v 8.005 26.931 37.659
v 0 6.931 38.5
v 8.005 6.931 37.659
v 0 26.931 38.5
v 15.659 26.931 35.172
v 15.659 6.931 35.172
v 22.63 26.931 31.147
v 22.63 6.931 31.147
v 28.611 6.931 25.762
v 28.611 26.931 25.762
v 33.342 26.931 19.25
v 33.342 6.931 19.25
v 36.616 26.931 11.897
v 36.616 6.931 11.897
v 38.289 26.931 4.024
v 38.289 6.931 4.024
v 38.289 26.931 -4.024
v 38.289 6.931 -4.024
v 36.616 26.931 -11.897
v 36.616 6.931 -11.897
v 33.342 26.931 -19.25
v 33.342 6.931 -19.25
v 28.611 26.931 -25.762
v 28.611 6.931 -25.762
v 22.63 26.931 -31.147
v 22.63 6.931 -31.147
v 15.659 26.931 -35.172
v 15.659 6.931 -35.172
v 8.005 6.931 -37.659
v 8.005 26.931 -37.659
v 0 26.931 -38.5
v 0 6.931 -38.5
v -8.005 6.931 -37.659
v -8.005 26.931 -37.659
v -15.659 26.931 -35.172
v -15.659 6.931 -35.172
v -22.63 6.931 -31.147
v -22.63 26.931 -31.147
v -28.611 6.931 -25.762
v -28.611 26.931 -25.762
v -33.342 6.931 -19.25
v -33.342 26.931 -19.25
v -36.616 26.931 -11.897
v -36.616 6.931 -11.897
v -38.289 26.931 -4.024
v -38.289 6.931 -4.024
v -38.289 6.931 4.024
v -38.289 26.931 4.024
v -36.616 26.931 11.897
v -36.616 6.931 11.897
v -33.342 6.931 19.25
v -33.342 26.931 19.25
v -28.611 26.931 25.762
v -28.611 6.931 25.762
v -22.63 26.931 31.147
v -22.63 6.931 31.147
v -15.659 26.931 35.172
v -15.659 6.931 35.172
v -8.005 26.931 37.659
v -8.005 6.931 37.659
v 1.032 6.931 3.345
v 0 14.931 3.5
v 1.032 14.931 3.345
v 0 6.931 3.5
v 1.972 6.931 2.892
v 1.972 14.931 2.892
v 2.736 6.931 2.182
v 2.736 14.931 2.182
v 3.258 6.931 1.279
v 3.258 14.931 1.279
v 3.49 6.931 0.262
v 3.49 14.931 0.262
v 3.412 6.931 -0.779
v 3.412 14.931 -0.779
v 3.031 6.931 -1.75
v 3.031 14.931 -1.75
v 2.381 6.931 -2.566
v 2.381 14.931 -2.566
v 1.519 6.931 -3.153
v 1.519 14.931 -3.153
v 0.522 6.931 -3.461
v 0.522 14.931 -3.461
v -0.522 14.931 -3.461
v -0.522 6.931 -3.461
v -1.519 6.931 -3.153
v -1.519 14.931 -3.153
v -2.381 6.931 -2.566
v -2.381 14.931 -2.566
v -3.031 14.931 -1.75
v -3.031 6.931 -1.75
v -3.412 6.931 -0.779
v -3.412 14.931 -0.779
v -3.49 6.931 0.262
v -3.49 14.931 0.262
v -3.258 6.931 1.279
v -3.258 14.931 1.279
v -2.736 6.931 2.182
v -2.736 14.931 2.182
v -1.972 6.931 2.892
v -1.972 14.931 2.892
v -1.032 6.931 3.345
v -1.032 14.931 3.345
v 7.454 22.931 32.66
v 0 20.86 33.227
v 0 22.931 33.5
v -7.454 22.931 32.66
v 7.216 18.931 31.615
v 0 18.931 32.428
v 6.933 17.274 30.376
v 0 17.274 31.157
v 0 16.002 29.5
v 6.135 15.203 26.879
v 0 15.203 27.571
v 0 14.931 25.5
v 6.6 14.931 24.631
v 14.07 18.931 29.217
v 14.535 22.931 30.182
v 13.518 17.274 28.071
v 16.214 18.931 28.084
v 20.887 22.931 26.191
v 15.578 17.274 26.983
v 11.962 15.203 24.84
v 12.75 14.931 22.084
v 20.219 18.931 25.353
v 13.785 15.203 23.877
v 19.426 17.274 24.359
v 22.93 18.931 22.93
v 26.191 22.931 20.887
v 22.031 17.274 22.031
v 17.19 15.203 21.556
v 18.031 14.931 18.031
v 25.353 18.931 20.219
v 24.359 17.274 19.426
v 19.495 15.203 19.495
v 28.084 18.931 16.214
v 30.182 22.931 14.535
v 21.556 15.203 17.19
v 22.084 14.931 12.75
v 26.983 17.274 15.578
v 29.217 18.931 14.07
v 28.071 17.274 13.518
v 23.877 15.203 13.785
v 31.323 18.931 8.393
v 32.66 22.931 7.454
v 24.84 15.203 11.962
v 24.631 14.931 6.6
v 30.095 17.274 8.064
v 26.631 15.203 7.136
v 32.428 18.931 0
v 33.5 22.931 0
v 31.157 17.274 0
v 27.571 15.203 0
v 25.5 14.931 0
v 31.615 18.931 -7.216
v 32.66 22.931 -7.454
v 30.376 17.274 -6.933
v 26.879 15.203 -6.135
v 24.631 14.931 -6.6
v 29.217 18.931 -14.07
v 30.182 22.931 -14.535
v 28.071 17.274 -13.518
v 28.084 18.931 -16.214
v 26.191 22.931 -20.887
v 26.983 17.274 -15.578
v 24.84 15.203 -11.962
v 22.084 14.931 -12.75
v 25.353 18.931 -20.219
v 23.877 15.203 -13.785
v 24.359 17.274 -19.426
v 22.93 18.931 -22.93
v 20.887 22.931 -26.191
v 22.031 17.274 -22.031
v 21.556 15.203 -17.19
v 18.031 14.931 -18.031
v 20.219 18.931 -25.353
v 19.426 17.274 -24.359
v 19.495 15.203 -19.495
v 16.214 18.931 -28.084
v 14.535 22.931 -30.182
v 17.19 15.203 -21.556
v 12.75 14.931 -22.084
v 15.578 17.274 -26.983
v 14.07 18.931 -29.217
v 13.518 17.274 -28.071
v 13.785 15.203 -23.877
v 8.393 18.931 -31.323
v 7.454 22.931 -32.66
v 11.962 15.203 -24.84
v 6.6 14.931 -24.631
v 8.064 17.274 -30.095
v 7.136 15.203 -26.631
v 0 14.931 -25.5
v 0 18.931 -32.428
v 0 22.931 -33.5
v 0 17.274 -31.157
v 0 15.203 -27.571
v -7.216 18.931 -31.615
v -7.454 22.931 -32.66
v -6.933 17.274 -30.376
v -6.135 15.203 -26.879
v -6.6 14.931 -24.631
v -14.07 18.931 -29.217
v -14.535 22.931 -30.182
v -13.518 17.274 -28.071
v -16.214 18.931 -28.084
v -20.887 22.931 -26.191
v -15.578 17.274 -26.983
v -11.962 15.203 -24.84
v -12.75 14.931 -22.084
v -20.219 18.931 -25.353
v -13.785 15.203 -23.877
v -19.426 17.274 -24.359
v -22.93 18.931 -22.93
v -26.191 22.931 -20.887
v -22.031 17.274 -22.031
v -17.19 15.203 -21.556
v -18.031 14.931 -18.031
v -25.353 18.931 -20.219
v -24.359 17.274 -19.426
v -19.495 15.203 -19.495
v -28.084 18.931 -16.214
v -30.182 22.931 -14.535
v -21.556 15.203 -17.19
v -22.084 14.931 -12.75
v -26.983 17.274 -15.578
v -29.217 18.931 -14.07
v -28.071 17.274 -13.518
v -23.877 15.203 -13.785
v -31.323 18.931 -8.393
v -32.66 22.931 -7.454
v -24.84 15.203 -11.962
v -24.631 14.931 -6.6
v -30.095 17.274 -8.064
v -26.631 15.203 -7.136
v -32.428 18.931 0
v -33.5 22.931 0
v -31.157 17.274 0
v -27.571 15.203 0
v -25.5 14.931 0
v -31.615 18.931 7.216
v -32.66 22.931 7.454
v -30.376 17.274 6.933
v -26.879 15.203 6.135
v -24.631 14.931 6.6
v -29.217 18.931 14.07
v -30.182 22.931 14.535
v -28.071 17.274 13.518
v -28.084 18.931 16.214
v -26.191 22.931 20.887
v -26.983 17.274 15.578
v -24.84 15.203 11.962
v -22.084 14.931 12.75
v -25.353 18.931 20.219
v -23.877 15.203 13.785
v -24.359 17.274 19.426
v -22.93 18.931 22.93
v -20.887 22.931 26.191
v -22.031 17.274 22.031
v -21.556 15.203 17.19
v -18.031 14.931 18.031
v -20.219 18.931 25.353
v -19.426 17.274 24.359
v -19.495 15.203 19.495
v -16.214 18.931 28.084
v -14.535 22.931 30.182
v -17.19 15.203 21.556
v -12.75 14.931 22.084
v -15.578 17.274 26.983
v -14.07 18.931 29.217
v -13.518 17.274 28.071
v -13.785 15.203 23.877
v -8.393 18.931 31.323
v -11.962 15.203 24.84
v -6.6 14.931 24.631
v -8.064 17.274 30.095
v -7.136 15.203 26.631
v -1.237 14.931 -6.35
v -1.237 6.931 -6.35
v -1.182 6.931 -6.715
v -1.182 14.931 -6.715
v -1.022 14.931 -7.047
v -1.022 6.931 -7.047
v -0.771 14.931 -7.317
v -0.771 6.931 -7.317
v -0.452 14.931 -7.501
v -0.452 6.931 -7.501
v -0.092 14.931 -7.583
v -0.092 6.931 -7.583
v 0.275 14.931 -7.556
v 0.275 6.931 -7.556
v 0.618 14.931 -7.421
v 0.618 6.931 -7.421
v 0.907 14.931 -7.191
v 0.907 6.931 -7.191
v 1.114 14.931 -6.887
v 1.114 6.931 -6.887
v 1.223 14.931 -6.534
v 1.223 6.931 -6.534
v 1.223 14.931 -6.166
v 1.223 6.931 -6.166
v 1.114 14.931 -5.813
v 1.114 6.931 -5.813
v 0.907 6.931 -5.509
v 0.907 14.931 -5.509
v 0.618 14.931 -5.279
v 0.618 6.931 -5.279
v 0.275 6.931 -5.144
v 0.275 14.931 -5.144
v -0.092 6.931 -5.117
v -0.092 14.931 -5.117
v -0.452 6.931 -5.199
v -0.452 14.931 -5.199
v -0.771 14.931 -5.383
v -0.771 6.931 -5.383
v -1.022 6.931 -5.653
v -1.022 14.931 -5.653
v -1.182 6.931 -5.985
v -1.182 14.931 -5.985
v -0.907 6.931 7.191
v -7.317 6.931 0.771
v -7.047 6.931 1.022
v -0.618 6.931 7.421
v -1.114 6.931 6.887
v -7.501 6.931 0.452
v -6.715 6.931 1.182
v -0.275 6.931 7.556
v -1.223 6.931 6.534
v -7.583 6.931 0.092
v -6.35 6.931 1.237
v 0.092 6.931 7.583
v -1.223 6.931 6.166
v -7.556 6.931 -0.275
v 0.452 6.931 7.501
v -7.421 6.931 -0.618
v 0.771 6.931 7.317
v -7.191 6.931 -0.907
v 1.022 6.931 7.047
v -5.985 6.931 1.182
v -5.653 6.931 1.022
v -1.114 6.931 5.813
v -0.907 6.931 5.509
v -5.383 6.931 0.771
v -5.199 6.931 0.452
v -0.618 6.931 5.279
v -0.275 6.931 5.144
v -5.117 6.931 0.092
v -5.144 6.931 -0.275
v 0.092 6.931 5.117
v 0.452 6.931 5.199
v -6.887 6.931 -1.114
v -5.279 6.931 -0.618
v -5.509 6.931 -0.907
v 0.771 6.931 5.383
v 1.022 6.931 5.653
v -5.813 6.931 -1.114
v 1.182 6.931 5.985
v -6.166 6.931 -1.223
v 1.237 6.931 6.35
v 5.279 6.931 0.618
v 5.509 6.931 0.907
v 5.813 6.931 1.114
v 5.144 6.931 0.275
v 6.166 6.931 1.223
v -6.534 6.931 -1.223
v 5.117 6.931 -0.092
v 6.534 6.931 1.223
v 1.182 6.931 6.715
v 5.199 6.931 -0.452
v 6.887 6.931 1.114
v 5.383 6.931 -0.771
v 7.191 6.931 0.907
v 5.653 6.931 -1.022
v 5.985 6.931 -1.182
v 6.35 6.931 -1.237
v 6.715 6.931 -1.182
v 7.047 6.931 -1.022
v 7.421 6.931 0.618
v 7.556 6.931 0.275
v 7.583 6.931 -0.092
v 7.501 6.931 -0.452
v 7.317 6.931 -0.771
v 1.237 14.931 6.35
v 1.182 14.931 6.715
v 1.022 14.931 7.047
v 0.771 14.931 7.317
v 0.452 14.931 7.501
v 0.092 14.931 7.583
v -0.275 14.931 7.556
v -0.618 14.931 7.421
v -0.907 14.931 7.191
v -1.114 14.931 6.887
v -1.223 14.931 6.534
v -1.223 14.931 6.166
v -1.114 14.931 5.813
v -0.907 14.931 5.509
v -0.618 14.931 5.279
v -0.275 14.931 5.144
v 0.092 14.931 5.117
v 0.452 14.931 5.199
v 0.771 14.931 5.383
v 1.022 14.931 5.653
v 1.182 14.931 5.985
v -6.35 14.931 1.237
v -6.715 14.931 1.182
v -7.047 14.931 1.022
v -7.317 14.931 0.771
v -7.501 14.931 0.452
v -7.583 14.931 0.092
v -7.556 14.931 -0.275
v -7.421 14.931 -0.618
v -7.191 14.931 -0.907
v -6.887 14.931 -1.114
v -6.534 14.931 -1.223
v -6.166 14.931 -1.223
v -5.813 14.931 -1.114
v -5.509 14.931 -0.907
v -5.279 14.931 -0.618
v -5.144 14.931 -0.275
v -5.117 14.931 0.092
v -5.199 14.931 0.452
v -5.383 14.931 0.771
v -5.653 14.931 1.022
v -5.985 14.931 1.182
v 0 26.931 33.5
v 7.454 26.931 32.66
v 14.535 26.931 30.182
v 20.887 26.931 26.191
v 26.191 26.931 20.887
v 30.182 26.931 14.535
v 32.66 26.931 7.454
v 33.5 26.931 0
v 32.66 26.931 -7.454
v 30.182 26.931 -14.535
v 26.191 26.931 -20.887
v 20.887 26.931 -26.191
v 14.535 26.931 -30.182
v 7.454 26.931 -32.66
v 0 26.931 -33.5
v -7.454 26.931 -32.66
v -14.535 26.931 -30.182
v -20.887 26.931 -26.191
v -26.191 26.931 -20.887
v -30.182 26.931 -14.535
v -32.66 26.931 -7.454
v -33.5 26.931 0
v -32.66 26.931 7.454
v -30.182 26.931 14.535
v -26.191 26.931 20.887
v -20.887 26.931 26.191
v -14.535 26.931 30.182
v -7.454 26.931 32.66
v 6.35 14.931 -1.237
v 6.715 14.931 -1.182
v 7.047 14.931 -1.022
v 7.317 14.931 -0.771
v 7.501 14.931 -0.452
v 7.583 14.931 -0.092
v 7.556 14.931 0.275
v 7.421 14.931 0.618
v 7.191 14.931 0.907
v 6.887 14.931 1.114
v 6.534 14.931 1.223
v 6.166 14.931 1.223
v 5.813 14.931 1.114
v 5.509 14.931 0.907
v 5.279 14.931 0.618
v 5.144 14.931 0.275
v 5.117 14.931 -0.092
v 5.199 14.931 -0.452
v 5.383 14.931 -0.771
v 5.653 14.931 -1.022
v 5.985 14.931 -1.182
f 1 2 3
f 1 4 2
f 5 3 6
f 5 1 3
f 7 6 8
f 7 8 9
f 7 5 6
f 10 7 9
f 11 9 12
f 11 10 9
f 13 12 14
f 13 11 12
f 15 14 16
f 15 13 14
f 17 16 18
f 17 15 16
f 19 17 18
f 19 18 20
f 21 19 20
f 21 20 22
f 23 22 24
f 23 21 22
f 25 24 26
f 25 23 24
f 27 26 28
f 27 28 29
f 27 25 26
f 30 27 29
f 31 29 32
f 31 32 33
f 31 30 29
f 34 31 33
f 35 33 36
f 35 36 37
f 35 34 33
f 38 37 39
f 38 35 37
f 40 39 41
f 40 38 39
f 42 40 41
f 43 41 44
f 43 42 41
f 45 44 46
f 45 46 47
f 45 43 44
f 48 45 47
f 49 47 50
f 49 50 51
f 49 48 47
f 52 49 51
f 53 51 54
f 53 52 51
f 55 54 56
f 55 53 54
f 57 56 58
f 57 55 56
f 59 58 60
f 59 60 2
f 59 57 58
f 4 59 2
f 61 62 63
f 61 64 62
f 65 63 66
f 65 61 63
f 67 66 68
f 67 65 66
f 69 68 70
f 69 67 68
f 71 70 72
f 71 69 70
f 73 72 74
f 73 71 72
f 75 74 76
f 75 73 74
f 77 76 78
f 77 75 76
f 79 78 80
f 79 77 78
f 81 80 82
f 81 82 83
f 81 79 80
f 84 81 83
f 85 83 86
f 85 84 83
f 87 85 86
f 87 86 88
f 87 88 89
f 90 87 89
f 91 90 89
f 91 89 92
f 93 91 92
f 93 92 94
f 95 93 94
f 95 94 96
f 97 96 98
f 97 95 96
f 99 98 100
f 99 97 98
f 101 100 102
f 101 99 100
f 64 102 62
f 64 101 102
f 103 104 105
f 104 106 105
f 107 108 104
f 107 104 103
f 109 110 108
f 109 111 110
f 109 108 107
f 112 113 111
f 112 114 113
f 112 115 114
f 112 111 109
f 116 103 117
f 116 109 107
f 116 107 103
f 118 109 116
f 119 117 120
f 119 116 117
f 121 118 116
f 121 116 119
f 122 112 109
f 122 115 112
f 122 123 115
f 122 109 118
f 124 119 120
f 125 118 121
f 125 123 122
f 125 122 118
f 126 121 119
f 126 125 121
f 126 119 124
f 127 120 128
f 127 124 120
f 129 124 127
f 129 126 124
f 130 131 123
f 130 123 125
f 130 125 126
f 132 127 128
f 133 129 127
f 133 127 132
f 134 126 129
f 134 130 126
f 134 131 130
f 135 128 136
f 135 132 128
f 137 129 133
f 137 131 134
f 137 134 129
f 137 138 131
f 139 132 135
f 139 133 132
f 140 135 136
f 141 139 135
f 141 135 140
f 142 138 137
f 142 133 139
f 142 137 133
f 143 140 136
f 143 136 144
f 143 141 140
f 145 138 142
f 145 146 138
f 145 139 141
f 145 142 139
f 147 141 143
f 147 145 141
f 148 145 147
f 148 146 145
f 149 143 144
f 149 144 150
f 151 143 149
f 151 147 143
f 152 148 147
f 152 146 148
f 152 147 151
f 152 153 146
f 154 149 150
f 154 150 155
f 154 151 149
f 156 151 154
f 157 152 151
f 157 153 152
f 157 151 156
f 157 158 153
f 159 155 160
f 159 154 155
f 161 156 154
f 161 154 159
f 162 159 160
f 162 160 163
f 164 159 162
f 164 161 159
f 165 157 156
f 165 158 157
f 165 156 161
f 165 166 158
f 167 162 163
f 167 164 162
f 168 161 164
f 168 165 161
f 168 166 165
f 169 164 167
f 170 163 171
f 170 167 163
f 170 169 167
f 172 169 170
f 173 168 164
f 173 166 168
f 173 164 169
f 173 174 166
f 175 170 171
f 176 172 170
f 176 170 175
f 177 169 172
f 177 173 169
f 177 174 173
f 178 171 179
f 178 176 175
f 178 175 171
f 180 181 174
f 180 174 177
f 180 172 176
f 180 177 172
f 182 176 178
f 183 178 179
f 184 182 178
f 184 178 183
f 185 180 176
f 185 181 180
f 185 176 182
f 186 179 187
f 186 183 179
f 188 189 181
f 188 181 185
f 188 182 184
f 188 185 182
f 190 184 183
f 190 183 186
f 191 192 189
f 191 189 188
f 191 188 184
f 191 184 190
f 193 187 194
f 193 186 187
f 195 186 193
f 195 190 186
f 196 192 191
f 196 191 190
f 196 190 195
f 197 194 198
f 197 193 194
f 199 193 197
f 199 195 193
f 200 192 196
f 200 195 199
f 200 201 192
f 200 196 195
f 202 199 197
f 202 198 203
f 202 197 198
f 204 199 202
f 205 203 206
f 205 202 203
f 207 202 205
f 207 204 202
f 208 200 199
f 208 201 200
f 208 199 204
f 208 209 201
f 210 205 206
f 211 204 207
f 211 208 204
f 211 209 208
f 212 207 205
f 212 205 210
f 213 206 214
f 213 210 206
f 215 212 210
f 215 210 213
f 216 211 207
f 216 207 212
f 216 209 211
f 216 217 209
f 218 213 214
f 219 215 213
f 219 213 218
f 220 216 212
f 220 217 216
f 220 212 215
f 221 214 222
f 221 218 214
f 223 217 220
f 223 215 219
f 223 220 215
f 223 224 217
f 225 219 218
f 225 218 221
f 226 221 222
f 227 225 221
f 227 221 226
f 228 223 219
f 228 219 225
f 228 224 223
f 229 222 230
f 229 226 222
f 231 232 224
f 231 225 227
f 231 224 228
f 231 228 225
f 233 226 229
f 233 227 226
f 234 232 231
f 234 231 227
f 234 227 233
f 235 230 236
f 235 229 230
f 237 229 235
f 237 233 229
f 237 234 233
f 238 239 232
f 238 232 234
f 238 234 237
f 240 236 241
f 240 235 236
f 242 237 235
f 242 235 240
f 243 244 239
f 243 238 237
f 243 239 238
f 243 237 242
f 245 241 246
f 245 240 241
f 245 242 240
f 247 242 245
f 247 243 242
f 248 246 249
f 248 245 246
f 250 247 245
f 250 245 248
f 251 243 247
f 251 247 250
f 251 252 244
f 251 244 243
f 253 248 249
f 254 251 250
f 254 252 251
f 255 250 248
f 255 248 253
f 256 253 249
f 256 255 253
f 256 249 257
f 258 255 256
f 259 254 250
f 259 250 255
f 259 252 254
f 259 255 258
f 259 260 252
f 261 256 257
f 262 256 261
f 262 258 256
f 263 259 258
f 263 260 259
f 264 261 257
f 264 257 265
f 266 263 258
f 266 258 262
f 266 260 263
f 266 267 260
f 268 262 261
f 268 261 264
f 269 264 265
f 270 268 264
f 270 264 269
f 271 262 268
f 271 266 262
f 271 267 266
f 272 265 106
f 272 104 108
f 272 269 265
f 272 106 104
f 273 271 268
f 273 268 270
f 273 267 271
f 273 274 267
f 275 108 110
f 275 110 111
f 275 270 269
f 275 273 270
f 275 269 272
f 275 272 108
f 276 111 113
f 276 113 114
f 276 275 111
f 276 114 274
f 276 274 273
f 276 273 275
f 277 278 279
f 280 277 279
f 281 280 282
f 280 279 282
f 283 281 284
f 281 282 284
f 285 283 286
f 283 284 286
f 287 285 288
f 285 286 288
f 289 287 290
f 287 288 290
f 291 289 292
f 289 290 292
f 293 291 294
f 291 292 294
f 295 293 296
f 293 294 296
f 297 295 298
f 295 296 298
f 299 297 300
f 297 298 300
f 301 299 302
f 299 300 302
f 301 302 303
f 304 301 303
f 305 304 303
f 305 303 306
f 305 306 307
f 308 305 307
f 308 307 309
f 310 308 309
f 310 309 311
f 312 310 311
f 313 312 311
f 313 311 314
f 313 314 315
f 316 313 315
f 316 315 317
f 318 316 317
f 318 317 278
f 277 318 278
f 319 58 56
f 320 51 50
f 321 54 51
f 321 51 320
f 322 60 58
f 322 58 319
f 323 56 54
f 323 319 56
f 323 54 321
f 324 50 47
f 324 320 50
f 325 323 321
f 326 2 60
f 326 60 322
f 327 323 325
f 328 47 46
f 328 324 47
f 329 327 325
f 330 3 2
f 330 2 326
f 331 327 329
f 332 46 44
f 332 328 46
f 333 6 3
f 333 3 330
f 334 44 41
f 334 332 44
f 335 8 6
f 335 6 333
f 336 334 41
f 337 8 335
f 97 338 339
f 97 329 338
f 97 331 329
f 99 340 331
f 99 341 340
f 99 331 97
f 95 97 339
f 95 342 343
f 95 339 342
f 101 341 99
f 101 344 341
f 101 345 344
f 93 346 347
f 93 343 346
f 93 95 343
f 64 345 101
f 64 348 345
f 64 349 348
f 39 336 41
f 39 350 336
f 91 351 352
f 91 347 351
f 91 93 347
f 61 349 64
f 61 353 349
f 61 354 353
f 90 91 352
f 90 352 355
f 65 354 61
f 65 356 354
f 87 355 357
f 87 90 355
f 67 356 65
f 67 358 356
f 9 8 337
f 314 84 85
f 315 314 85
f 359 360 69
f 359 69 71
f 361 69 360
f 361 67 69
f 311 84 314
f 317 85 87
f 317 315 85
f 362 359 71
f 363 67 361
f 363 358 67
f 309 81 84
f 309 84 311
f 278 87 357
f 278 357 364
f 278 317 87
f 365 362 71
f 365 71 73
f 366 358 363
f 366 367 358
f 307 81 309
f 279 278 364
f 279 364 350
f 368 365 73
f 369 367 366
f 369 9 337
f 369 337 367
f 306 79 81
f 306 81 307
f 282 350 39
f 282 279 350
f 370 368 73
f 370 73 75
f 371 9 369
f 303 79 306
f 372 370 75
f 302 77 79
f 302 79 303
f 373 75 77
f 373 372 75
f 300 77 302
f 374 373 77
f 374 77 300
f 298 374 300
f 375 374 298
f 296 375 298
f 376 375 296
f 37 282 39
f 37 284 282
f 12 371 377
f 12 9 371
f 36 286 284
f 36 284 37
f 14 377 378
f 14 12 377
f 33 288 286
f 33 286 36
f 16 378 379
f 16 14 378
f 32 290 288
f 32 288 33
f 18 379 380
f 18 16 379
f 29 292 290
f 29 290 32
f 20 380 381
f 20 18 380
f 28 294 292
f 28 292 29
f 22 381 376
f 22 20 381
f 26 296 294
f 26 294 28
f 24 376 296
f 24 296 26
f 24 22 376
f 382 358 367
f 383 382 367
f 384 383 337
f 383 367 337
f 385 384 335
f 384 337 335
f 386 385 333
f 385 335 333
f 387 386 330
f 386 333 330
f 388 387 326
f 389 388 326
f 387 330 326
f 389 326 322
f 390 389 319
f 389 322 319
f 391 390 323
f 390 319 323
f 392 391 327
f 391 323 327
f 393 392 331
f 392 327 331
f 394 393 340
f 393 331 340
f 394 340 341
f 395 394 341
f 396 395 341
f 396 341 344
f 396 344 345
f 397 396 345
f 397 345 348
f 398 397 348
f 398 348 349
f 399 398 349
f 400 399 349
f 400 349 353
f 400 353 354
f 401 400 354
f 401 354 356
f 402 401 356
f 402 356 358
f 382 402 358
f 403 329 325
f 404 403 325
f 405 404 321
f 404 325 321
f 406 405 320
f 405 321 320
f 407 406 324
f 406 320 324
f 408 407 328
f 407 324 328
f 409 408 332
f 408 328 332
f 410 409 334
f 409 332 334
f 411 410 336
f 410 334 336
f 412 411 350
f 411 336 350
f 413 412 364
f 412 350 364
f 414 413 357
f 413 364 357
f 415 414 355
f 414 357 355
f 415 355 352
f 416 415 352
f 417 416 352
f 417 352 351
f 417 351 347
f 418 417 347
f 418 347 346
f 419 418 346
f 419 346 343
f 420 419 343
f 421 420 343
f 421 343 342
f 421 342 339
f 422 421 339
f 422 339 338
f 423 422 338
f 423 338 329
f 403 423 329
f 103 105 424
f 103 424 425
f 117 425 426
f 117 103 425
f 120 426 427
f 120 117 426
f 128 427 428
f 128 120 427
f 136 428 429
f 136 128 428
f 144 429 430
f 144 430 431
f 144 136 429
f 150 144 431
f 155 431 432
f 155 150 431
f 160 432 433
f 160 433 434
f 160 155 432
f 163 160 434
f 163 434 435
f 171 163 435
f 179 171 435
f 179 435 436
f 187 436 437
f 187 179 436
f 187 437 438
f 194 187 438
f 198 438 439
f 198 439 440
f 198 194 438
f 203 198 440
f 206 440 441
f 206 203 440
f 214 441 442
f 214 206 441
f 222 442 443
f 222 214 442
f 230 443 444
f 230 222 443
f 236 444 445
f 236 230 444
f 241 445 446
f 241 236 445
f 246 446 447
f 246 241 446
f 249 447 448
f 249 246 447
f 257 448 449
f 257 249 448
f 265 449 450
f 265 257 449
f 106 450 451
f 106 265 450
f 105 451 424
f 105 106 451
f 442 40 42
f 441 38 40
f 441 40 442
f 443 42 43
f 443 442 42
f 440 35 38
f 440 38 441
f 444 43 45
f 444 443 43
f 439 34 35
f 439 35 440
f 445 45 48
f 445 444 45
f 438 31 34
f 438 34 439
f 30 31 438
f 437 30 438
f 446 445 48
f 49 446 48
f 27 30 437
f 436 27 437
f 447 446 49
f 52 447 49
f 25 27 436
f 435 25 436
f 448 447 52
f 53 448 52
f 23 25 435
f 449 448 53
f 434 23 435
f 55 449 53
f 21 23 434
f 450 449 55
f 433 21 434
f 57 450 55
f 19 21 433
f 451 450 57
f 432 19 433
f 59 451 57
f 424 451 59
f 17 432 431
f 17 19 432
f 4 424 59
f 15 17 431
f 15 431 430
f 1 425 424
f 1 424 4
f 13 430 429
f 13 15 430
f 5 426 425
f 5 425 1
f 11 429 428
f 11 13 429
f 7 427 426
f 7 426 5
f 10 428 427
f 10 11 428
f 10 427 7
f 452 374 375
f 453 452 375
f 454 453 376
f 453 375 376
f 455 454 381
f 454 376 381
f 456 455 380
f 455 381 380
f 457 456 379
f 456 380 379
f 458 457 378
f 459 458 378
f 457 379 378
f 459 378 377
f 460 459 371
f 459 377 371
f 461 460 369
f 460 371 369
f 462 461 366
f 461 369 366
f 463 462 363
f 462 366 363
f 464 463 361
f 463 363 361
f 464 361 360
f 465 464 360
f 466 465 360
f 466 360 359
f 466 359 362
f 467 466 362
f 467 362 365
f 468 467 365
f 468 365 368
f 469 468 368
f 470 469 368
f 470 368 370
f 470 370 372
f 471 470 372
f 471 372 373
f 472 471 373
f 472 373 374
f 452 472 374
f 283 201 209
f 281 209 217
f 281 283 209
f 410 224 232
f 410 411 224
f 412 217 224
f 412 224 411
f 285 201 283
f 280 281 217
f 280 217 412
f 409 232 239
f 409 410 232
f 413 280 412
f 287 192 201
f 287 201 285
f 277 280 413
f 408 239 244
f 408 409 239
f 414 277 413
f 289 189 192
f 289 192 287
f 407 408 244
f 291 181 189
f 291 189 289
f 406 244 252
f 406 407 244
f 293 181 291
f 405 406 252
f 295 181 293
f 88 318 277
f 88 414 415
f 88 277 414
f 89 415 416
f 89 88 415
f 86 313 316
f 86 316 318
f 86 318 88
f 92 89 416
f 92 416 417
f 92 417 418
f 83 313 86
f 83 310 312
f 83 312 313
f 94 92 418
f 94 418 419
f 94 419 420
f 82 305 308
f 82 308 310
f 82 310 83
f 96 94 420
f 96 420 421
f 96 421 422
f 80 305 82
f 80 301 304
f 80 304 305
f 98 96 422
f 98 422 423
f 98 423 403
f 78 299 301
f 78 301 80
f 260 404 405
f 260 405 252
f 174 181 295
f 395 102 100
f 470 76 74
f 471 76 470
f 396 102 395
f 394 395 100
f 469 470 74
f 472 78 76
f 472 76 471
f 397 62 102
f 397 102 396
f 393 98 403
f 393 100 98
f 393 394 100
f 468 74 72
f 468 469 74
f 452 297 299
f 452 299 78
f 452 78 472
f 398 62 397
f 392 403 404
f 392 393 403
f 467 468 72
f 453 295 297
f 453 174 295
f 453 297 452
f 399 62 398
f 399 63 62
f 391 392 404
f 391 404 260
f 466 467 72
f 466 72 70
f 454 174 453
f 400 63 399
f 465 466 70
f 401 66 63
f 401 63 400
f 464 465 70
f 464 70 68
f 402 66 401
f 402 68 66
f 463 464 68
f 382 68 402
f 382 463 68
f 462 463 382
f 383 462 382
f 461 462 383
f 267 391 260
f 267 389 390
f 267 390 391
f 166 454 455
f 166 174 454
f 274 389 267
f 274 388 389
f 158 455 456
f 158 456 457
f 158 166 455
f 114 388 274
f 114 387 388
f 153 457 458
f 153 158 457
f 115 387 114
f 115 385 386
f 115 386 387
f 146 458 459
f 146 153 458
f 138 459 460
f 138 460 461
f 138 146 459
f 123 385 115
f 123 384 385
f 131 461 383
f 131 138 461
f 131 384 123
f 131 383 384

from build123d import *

# Parameters (mm, degrees)
SKETCH001_R        = 1.236716
POCKET_DEPTH       = 241.432705
POLARPATTERN_COUNT = 4
FILLET_R           = 8


with BuildPart() as part:
    # Sketch → Revolution (revolve)
    with BuildSketch(Plane.YZ):
        Polygon((6.930658, 38.5), (26.930658, 38.5), (26.930658, 33.5), (14.930658, 33.5), (14.930658, 3.5), (6.930658, 3.5), align=None)
    revolve(axis=Axis((0, 0, 0), (0, 1, 0)))

    # Sketch001 (on Face6 of Revolution) → Pocket (cut, through all)
    with BuildSketch(Plane(origin=(0, 6.930658, 0), x_dir=(0, 0, -1), z_dir=(0, -1, 0))):
        with Locations((0, 6.35)):
            Circle(SKETCH001_R)
    pocket = extrude(amount=-POCKET_DEPTH, mode=Mode.SUBTRACT)

    # PolarPattern: Pocket ×4 about axis
    polarpattern_axis = Axis((0, 6.930658, 0), (0, -1, 0))
    for i in range(1, POLARPATTERN_COUNT):
        add(pocket.rotate(polarpattern_axis, i * 360 / POLARPATTERN_COUNT), mode=Mode.SUBTRACT)

    # Fillet
    fillet_edges = [part.edges().sort_by_distance(p)[0] for p in [
        (0, 14.930658, -33.5),
    ]]
    fillet(fillet_edges, radius=FILLET_R)


solid = part.part
